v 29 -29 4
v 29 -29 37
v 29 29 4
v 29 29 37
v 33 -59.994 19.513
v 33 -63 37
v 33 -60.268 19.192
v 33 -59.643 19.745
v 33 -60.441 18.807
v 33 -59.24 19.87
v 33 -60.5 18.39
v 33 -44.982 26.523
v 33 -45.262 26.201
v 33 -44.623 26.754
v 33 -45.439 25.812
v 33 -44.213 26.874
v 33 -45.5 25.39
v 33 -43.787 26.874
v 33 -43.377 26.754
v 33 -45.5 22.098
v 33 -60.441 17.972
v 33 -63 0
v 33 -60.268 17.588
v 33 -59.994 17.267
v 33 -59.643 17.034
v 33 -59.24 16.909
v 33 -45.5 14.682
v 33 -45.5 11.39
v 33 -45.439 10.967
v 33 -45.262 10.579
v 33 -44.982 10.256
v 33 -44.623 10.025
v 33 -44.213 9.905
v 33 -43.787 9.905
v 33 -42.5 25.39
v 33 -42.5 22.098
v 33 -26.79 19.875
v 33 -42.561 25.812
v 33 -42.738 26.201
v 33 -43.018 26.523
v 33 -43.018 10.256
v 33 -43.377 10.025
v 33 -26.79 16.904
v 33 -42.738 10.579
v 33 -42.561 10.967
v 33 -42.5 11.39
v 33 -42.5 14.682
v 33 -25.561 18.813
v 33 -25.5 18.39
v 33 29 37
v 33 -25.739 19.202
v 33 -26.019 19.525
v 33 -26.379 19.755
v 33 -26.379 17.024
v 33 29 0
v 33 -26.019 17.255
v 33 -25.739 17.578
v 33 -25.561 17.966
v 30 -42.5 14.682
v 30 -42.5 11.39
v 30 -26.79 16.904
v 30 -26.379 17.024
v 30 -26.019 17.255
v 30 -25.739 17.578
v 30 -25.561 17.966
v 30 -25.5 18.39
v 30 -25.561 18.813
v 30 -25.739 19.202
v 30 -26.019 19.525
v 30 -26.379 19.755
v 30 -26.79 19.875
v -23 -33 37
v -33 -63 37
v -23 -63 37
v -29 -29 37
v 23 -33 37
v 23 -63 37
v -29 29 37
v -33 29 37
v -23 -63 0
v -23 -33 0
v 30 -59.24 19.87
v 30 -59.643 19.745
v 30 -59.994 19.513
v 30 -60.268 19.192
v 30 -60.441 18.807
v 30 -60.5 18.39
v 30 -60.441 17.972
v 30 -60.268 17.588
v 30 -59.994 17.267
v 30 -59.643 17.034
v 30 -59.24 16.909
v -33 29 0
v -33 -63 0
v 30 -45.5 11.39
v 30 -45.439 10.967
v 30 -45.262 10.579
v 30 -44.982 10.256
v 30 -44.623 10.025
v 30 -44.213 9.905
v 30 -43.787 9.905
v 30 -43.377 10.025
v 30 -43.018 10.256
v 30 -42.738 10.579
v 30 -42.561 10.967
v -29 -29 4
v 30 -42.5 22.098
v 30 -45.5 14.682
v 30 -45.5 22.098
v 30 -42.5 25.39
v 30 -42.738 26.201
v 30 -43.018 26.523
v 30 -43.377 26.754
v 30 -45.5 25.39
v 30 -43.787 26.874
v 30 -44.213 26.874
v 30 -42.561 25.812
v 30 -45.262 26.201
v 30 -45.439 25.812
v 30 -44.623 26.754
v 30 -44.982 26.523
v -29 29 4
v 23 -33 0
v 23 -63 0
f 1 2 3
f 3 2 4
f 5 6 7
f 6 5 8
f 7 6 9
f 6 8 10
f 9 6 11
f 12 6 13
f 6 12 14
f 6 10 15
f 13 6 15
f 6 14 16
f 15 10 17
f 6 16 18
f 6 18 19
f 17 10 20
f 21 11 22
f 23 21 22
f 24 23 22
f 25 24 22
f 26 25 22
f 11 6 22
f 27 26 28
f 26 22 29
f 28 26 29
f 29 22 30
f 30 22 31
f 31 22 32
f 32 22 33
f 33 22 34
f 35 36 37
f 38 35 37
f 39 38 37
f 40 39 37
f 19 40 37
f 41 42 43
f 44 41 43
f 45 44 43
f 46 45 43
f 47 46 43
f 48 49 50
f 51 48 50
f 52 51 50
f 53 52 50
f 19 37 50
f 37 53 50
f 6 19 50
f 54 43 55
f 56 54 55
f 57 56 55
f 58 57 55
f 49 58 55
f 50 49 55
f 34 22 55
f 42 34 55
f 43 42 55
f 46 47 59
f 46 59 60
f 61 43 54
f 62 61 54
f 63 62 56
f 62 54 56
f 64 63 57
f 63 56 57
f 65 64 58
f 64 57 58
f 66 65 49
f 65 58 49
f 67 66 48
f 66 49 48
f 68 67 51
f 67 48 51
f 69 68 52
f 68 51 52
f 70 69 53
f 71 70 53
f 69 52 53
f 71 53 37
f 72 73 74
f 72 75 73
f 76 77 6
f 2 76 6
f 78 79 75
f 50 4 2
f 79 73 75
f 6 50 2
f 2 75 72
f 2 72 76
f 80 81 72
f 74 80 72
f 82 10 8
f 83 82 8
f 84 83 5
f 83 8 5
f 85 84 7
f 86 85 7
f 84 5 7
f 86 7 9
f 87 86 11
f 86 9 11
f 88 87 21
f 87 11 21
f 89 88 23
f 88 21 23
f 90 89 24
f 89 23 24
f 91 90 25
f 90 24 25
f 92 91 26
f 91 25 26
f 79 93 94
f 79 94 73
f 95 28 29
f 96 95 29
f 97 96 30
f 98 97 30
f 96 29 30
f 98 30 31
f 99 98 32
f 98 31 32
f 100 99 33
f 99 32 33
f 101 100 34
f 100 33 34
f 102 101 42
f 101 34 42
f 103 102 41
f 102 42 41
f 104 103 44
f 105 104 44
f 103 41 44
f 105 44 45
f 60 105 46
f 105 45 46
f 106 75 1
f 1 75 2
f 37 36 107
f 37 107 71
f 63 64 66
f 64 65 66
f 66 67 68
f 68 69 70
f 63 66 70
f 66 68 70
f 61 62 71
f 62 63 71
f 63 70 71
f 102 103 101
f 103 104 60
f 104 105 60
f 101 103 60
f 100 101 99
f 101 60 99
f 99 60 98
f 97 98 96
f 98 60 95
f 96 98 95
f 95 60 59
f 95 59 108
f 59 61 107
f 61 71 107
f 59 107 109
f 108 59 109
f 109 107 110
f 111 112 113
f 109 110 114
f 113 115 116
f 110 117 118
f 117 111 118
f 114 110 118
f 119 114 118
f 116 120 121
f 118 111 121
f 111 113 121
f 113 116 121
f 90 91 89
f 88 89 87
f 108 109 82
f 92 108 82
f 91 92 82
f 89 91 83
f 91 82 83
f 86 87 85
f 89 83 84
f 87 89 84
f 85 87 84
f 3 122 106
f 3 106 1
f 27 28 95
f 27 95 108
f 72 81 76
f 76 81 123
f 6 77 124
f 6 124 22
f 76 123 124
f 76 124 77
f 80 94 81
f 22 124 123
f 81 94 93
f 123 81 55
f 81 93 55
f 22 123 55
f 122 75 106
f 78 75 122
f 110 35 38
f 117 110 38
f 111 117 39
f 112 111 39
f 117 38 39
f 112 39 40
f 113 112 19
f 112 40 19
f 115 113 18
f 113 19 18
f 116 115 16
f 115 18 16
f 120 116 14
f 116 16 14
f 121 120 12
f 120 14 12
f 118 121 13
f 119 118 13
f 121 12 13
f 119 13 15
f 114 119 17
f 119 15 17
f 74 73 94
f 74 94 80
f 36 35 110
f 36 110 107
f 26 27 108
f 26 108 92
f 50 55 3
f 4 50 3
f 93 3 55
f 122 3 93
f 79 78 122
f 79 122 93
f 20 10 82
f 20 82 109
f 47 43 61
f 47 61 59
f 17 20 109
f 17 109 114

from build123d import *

# Parameters (mm, degrees)
SKETCH_W        = 66
SKETCH_H        = 66
PAD_DEPTH       = 37
SKETCH001_W     = 58
SKETCH001_H     = 58
POCKET_DEPTH    = 33
SKETCH002_W     = 10
SKETCH002_H     = 37
PAD001_DEPTH    = 30
SKETCH003_W     = 66
SKETCH003_H     = 37
POCKET001_DEPTH = 4
POCKET002_DEPTH = 3


with BuildPart() as part:
    # Sketch → Pad (new body)
    with BuildSketch(Plane.XY):
        Rectangle(SKETCH_W, SKETCH_H)
    extrude(amount=PAD_DEPTH)

    # Sketch001 → Pocket (cut)
    with BuildSketch(Plane.XY.offset(37)):
        Rectangle(SKETCH001_W, SKETCH001_H)
    extrude(amount=-POCKET_DEPTH, mode=Mode.SUBTRACT)

    # Sketch002 → Pad001 (new body)
    with BuildSketch(Plane.XZ.offset(33)):
        with Locations((-28, 18.5)):
            Rectangle(SKETCH002_W, SKETCH002_H)
        with Locations((28, 18.5)):
            Rectangle(SKETCH002_W, SKETCH002_H)
    extrude(amount=PAD001_DEPTH)

    # Sketch003 → Pocket001 (cut)
    with BuildSketch(Plane(origin=(0, 33, 0), x_dir=(-1, 0, 0), z_dir=(0, 1, 0))):
        with Locations((0, 18.5)):
            Rectangle(SKETCH003_W, SKETCH003_H)
    extrude(amount=-POCKET001_DEPTH, mode=Mode.SUBTRACT)

    # Sketch005 → Pocket002 (cut)
    with BuildSketch(Plane.YZ.offset(33)):
        with BuildLine():
            Line((-45.5, 22.09772), (-45.5, 25.389621))
            ThreePointArc((-42.5, 25.389621), (-44, 26.889621), (-45.5, 25.389621))
            Line((-42.5, 25.389621), (-42.5, 22.09772))
            Line((-42.5, 22.09772), (-26.789852, 19.874827))
            ThreePointArc((-26.789852, 16.904415), (-25.5, 18.389621), (-26.789852, 19.874827))
            Line((-26.789852, 16.904415), (-42.5, 14.681522))
            Line((-42.5, 14.681522), (-42.5, 11.389621))
            ThreePointArc((-45.5, 11.389621), (-44, 9.889621), (-42.5, 11.389621))
            Line((-45.5, 11.389621), (-45.5, 14.681522))
            Line((-45.5, 14.681522), (-59.240035, 16.908951))
            ThreePointArc((-59.240035, 19.870291), (-60.5, 18.389621), (-59.240035, 16.908951))
            Line((-59.240035, 19.870291), (-45.5, 22.09772))
        make_face()
    extrude(amount=-POCKET002_DEPTH, mode=Mode.SUBTRACT)


solid = part.part
